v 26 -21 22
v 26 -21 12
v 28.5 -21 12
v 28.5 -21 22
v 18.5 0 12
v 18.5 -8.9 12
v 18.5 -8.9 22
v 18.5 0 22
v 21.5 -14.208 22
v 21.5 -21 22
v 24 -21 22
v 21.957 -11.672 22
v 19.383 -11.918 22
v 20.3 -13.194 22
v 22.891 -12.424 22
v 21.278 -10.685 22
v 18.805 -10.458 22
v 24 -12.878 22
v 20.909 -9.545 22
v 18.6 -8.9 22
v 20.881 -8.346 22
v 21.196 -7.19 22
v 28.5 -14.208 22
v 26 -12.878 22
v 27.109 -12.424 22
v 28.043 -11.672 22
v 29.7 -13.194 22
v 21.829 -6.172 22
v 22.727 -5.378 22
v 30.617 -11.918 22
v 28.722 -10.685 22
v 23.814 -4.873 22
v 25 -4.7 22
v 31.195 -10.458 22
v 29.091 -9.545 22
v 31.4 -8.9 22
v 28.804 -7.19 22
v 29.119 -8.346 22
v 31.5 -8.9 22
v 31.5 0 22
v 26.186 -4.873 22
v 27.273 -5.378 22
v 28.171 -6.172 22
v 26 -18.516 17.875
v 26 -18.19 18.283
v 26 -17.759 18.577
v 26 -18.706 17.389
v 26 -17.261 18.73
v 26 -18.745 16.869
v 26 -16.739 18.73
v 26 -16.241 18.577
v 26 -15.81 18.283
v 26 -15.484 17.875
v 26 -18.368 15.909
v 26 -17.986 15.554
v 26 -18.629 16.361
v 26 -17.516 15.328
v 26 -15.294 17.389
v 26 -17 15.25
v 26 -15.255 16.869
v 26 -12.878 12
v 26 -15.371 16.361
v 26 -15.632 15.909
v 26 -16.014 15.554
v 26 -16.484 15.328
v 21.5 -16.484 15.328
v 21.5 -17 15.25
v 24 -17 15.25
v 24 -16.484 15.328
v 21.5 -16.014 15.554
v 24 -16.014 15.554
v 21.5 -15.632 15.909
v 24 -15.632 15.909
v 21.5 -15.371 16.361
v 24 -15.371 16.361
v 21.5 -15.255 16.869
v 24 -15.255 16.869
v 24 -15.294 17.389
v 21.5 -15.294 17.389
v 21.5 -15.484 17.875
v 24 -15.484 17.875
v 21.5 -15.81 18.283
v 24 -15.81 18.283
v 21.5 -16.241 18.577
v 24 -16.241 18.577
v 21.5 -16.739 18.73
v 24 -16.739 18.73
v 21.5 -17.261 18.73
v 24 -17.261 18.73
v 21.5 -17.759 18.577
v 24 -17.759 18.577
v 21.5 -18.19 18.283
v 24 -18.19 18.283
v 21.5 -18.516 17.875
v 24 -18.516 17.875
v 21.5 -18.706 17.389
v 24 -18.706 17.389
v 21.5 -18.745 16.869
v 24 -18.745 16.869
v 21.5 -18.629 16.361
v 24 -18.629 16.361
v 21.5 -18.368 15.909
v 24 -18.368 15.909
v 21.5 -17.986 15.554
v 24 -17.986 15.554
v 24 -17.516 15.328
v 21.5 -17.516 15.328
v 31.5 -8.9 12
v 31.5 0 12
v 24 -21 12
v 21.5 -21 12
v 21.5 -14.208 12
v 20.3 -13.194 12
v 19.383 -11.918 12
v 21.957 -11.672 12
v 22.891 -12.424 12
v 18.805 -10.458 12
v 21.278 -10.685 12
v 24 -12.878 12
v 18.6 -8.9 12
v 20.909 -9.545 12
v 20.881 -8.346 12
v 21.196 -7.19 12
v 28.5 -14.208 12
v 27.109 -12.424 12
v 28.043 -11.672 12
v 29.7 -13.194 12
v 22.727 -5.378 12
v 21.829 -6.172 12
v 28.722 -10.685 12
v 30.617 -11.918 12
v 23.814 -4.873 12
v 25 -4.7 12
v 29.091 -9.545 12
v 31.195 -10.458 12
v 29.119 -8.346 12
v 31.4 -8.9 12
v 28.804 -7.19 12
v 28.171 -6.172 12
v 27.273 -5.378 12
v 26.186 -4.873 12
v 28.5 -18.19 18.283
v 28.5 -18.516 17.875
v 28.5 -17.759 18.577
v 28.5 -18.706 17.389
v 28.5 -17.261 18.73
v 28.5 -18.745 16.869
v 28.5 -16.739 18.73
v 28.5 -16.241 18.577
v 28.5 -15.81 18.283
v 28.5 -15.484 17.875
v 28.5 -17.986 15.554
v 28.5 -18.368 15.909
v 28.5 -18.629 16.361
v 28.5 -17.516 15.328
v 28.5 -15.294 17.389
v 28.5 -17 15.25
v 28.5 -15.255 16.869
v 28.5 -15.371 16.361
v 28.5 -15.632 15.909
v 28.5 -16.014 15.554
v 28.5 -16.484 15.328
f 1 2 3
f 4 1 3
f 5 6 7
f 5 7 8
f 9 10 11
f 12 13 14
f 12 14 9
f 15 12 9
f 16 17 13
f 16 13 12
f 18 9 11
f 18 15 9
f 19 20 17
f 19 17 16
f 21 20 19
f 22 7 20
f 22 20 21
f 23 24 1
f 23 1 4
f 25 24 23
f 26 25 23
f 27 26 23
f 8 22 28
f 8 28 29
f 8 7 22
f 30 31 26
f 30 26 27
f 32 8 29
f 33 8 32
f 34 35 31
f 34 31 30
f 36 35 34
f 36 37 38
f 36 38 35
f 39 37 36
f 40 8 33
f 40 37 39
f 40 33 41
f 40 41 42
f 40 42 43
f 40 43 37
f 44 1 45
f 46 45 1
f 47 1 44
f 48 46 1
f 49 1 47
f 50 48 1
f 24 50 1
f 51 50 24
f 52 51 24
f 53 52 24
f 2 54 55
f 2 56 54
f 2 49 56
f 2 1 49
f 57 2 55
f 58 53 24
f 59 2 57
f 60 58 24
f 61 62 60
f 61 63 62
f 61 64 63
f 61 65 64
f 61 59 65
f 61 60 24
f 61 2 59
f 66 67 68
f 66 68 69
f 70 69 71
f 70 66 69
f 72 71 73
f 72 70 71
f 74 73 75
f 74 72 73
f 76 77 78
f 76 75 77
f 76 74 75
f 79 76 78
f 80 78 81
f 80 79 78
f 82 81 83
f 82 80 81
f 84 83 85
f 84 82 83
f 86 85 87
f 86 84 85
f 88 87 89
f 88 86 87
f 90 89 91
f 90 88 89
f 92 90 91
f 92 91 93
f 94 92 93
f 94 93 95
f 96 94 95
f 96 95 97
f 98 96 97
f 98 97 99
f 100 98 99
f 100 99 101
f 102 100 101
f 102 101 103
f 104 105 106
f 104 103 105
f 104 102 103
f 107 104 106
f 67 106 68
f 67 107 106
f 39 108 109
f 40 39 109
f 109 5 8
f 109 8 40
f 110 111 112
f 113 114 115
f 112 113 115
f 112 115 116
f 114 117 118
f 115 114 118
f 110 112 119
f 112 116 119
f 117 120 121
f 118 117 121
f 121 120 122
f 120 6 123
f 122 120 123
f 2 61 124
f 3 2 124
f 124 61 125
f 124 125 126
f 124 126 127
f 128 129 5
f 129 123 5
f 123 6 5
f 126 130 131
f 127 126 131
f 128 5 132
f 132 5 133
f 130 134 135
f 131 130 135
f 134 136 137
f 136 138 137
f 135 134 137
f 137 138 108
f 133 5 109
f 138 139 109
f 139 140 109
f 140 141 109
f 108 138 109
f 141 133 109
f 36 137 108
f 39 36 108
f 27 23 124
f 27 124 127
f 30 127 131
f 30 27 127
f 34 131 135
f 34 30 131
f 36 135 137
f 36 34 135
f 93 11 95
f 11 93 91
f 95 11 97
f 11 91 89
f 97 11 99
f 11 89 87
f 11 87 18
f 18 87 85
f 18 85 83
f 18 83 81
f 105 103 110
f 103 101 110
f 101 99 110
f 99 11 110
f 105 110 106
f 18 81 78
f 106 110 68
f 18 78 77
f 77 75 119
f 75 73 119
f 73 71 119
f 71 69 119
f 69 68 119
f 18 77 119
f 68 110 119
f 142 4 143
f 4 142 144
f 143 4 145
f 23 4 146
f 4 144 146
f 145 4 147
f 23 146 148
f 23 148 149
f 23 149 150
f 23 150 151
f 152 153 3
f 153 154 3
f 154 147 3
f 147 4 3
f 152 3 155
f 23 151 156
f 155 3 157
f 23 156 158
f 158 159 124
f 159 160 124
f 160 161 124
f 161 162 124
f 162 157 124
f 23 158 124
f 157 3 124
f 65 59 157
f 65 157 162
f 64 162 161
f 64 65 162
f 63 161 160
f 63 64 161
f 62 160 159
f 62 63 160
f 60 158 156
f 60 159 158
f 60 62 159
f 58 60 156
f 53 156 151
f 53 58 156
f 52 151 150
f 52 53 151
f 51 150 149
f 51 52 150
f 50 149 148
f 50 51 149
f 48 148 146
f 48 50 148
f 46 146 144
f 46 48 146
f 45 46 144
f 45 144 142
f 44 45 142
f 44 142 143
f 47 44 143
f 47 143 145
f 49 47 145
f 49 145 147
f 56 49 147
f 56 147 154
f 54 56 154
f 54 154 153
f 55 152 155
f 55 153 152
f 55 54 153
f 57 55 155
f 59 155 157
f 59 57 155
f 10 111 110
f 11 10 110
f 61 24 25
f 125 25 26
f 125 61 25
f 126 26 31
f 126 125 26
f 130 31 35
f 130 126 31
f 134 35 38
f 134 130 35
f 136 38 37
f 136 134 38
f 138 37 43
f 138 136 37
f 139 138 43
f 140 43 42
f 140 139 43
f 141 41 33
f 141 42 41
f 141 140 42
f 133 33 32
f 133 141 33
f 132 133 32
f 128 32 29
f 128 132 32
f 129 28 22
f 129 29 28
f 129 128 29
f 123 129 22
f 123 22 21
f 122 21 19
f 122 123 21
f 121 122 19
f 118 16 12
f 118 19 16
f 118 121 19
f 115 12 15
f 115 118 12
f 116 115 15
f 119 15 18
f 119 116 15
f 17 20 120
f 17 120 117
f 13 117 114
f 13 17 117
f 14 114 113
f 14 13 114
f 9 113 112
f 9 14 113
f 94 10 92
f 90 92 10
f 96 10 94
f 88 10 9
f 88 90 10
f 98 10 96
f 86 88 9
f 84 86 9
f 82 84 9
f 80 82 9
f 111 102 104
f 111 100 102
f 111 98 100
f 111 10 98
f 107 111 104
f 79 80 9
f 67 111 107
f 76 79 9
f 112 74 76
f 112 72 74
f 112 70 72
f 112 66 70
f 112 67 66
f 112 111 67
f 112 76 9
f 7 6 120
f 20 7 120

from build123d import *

# Parameters (mm, degrees)
CYLINDER003_W     = 6.4
CYLINDER003_H     = 22
CYLINDER003_ANGLE = 90
BOX004_W          = 10
BOX004_H          = 12.1
BOX004_DEPTH      = 22
CYLINDER002_W     = 6.4
CYLINDER002_H     = 22
CYLINDER002_ANGLE = 90
BOX003_W          = 10
BOX003_H          = 12.1
BOX003_DEPTH      = 22
BOX002_W          = 2
BOX002_H          = 11
BOX002_DEPTH      = 22
CYLINDER001_R     = 1.75
CYLINDER001_DEPTH = 18
CYLINDER_R        = 4.15
CYLINDER_DEPTH    = 22
BOX001_W          = 13
BOX001_H          = 21
BOX001_DEPTH      = 10


with BuildPart() as cylinder003:
    # Cylinder003 → Cylinder003 (revolve)
    with BuildSketch(Plane(origin=(25, -6.85, -3), x_dir=(-1, 0, 0), z_dir=(0, 1, 0))):
        with Locations((3.2, 11)):
            Rectangle(CYLINDER003_W, CYLINDER003_H)
    revolve(axis=Axis((25, -6.85, -3), (0, 0, 1)), revolution_arc=CYLINDER003_ANGLE)


with BuildPart() as cut004:
    # Box004 → Box004 (new body)
    with BuildSketch(Plane(origin=(11.5, -19, -3), x_dir=(1, 0, 0), z_dir=(0, 0, 1))):
        with Locations((5, 6.05)):
            Rectangle(BOX004_W, BOX004_H)
    extrude(amount=BOX004_DEPTH)

    # Cut004: cut Cylinder003
    add(cylinder003.part, mode=Mode.SUBTRACT)


with BuildPart() as cylinder002:
    # Cylinder002 → Cylinder002 (revolve)
    with BuildSketch(Plane(origin=(25, -6.85, -3), x_dir=(0, -1, 0), z_dir=(-1, 0, 0))):
        with Locations((3.2, 11)):
            Rectangle(CYLINDER002_W, CYLINDER002_H)
    revolve(axis=Axis((25, -6.85, -3), (0, 0, 1)), revolution_arc=CYLINDER002_ANGLE)


with BuildPart() as cut003:
    # Box003 → Box003 (new body)
    with BuildSketch(Plane(origin=(28.5, -19, -3), x_dir=(1, 0, 0), z_dir=(0, 0, 1))):
        with Locations((5, 6.05)):
            Rectangle(BOX003_W, BOX003_H)
    extrude(amount=BOX003_DEPTH)

    # Cut003: cut Cylinder002
    add(cylinder002.part, mode=Mode.SUBTRACT)


with BuildPart() as cube002:
    # Box002 → Box002 (new body)
    with BuildSketch(Plane(origin=(24, -21, -3), x_dir=(1, 0, 0), z_dir=(0, 0, 1))):
        with Locations((1, 5.5)):
            Rectangle(BOX002_W, BOX002_H)
    extrude(amount=BOX002_DEPTH)


with BuildPart() as cylinder001:
    # Cylinder001 → Cylinder001 (new body)
    with BuildSketch(Plane(origin=(16, -15, 5), x_dir=(0, 0, -1), z_dir=(1, 0, 0))):
        Circle(CYLINDER001_R)
    extrude(amount=CYLINDER001_DEPTH)


with BuildPart() as cylinder:
    # Cylinder → Cylinder (new body)
    with BuildSketch(Plane(origin=(25, -6.85, -3), x_dir=(1, 0, 0), z_dir=(0, 0, 1))):
        Circle(CYLINDER_R)
    extrude(amount=CYLINDER_DEPTH)


with BuildPart() as cut006:
    # Box001 → Box001 (new body)
    with BuildSketch(Plane(origin=(18.5, -19, 0), x_dir=(1, 0, 0), z_dir=(0, 0, 1))):
        with Locations((6.5, 10.5)):
            Rectangle(BOX001_W, BOX001_H)
    extrude(amount=BOX001_DEPTH)

    # Cut: cut Cylinder
    add(cylinder.part, mode=Mode.SUBTRACT)

    # Cut001: cut Cylinder001
    add(cylinder001.part, mode=Mode.SUBTRACT)

    # Cut002: cut Cube002
    add(cube002.part, mode=Mode.SUBTRACT)

    # Cut005: cut Cut003
    add(cut003.part, mode=Mode.SUBTRACT)

    # Cut006: cut Cut004
    add(cut004.part, mode=Mode.SUBTRACT)


with BuildPart() as cut006_1:
    # Cut006 placement: moved
    add(cut006.part.moved(Location((0, -2, 12))))


solid = cut006_1.part
